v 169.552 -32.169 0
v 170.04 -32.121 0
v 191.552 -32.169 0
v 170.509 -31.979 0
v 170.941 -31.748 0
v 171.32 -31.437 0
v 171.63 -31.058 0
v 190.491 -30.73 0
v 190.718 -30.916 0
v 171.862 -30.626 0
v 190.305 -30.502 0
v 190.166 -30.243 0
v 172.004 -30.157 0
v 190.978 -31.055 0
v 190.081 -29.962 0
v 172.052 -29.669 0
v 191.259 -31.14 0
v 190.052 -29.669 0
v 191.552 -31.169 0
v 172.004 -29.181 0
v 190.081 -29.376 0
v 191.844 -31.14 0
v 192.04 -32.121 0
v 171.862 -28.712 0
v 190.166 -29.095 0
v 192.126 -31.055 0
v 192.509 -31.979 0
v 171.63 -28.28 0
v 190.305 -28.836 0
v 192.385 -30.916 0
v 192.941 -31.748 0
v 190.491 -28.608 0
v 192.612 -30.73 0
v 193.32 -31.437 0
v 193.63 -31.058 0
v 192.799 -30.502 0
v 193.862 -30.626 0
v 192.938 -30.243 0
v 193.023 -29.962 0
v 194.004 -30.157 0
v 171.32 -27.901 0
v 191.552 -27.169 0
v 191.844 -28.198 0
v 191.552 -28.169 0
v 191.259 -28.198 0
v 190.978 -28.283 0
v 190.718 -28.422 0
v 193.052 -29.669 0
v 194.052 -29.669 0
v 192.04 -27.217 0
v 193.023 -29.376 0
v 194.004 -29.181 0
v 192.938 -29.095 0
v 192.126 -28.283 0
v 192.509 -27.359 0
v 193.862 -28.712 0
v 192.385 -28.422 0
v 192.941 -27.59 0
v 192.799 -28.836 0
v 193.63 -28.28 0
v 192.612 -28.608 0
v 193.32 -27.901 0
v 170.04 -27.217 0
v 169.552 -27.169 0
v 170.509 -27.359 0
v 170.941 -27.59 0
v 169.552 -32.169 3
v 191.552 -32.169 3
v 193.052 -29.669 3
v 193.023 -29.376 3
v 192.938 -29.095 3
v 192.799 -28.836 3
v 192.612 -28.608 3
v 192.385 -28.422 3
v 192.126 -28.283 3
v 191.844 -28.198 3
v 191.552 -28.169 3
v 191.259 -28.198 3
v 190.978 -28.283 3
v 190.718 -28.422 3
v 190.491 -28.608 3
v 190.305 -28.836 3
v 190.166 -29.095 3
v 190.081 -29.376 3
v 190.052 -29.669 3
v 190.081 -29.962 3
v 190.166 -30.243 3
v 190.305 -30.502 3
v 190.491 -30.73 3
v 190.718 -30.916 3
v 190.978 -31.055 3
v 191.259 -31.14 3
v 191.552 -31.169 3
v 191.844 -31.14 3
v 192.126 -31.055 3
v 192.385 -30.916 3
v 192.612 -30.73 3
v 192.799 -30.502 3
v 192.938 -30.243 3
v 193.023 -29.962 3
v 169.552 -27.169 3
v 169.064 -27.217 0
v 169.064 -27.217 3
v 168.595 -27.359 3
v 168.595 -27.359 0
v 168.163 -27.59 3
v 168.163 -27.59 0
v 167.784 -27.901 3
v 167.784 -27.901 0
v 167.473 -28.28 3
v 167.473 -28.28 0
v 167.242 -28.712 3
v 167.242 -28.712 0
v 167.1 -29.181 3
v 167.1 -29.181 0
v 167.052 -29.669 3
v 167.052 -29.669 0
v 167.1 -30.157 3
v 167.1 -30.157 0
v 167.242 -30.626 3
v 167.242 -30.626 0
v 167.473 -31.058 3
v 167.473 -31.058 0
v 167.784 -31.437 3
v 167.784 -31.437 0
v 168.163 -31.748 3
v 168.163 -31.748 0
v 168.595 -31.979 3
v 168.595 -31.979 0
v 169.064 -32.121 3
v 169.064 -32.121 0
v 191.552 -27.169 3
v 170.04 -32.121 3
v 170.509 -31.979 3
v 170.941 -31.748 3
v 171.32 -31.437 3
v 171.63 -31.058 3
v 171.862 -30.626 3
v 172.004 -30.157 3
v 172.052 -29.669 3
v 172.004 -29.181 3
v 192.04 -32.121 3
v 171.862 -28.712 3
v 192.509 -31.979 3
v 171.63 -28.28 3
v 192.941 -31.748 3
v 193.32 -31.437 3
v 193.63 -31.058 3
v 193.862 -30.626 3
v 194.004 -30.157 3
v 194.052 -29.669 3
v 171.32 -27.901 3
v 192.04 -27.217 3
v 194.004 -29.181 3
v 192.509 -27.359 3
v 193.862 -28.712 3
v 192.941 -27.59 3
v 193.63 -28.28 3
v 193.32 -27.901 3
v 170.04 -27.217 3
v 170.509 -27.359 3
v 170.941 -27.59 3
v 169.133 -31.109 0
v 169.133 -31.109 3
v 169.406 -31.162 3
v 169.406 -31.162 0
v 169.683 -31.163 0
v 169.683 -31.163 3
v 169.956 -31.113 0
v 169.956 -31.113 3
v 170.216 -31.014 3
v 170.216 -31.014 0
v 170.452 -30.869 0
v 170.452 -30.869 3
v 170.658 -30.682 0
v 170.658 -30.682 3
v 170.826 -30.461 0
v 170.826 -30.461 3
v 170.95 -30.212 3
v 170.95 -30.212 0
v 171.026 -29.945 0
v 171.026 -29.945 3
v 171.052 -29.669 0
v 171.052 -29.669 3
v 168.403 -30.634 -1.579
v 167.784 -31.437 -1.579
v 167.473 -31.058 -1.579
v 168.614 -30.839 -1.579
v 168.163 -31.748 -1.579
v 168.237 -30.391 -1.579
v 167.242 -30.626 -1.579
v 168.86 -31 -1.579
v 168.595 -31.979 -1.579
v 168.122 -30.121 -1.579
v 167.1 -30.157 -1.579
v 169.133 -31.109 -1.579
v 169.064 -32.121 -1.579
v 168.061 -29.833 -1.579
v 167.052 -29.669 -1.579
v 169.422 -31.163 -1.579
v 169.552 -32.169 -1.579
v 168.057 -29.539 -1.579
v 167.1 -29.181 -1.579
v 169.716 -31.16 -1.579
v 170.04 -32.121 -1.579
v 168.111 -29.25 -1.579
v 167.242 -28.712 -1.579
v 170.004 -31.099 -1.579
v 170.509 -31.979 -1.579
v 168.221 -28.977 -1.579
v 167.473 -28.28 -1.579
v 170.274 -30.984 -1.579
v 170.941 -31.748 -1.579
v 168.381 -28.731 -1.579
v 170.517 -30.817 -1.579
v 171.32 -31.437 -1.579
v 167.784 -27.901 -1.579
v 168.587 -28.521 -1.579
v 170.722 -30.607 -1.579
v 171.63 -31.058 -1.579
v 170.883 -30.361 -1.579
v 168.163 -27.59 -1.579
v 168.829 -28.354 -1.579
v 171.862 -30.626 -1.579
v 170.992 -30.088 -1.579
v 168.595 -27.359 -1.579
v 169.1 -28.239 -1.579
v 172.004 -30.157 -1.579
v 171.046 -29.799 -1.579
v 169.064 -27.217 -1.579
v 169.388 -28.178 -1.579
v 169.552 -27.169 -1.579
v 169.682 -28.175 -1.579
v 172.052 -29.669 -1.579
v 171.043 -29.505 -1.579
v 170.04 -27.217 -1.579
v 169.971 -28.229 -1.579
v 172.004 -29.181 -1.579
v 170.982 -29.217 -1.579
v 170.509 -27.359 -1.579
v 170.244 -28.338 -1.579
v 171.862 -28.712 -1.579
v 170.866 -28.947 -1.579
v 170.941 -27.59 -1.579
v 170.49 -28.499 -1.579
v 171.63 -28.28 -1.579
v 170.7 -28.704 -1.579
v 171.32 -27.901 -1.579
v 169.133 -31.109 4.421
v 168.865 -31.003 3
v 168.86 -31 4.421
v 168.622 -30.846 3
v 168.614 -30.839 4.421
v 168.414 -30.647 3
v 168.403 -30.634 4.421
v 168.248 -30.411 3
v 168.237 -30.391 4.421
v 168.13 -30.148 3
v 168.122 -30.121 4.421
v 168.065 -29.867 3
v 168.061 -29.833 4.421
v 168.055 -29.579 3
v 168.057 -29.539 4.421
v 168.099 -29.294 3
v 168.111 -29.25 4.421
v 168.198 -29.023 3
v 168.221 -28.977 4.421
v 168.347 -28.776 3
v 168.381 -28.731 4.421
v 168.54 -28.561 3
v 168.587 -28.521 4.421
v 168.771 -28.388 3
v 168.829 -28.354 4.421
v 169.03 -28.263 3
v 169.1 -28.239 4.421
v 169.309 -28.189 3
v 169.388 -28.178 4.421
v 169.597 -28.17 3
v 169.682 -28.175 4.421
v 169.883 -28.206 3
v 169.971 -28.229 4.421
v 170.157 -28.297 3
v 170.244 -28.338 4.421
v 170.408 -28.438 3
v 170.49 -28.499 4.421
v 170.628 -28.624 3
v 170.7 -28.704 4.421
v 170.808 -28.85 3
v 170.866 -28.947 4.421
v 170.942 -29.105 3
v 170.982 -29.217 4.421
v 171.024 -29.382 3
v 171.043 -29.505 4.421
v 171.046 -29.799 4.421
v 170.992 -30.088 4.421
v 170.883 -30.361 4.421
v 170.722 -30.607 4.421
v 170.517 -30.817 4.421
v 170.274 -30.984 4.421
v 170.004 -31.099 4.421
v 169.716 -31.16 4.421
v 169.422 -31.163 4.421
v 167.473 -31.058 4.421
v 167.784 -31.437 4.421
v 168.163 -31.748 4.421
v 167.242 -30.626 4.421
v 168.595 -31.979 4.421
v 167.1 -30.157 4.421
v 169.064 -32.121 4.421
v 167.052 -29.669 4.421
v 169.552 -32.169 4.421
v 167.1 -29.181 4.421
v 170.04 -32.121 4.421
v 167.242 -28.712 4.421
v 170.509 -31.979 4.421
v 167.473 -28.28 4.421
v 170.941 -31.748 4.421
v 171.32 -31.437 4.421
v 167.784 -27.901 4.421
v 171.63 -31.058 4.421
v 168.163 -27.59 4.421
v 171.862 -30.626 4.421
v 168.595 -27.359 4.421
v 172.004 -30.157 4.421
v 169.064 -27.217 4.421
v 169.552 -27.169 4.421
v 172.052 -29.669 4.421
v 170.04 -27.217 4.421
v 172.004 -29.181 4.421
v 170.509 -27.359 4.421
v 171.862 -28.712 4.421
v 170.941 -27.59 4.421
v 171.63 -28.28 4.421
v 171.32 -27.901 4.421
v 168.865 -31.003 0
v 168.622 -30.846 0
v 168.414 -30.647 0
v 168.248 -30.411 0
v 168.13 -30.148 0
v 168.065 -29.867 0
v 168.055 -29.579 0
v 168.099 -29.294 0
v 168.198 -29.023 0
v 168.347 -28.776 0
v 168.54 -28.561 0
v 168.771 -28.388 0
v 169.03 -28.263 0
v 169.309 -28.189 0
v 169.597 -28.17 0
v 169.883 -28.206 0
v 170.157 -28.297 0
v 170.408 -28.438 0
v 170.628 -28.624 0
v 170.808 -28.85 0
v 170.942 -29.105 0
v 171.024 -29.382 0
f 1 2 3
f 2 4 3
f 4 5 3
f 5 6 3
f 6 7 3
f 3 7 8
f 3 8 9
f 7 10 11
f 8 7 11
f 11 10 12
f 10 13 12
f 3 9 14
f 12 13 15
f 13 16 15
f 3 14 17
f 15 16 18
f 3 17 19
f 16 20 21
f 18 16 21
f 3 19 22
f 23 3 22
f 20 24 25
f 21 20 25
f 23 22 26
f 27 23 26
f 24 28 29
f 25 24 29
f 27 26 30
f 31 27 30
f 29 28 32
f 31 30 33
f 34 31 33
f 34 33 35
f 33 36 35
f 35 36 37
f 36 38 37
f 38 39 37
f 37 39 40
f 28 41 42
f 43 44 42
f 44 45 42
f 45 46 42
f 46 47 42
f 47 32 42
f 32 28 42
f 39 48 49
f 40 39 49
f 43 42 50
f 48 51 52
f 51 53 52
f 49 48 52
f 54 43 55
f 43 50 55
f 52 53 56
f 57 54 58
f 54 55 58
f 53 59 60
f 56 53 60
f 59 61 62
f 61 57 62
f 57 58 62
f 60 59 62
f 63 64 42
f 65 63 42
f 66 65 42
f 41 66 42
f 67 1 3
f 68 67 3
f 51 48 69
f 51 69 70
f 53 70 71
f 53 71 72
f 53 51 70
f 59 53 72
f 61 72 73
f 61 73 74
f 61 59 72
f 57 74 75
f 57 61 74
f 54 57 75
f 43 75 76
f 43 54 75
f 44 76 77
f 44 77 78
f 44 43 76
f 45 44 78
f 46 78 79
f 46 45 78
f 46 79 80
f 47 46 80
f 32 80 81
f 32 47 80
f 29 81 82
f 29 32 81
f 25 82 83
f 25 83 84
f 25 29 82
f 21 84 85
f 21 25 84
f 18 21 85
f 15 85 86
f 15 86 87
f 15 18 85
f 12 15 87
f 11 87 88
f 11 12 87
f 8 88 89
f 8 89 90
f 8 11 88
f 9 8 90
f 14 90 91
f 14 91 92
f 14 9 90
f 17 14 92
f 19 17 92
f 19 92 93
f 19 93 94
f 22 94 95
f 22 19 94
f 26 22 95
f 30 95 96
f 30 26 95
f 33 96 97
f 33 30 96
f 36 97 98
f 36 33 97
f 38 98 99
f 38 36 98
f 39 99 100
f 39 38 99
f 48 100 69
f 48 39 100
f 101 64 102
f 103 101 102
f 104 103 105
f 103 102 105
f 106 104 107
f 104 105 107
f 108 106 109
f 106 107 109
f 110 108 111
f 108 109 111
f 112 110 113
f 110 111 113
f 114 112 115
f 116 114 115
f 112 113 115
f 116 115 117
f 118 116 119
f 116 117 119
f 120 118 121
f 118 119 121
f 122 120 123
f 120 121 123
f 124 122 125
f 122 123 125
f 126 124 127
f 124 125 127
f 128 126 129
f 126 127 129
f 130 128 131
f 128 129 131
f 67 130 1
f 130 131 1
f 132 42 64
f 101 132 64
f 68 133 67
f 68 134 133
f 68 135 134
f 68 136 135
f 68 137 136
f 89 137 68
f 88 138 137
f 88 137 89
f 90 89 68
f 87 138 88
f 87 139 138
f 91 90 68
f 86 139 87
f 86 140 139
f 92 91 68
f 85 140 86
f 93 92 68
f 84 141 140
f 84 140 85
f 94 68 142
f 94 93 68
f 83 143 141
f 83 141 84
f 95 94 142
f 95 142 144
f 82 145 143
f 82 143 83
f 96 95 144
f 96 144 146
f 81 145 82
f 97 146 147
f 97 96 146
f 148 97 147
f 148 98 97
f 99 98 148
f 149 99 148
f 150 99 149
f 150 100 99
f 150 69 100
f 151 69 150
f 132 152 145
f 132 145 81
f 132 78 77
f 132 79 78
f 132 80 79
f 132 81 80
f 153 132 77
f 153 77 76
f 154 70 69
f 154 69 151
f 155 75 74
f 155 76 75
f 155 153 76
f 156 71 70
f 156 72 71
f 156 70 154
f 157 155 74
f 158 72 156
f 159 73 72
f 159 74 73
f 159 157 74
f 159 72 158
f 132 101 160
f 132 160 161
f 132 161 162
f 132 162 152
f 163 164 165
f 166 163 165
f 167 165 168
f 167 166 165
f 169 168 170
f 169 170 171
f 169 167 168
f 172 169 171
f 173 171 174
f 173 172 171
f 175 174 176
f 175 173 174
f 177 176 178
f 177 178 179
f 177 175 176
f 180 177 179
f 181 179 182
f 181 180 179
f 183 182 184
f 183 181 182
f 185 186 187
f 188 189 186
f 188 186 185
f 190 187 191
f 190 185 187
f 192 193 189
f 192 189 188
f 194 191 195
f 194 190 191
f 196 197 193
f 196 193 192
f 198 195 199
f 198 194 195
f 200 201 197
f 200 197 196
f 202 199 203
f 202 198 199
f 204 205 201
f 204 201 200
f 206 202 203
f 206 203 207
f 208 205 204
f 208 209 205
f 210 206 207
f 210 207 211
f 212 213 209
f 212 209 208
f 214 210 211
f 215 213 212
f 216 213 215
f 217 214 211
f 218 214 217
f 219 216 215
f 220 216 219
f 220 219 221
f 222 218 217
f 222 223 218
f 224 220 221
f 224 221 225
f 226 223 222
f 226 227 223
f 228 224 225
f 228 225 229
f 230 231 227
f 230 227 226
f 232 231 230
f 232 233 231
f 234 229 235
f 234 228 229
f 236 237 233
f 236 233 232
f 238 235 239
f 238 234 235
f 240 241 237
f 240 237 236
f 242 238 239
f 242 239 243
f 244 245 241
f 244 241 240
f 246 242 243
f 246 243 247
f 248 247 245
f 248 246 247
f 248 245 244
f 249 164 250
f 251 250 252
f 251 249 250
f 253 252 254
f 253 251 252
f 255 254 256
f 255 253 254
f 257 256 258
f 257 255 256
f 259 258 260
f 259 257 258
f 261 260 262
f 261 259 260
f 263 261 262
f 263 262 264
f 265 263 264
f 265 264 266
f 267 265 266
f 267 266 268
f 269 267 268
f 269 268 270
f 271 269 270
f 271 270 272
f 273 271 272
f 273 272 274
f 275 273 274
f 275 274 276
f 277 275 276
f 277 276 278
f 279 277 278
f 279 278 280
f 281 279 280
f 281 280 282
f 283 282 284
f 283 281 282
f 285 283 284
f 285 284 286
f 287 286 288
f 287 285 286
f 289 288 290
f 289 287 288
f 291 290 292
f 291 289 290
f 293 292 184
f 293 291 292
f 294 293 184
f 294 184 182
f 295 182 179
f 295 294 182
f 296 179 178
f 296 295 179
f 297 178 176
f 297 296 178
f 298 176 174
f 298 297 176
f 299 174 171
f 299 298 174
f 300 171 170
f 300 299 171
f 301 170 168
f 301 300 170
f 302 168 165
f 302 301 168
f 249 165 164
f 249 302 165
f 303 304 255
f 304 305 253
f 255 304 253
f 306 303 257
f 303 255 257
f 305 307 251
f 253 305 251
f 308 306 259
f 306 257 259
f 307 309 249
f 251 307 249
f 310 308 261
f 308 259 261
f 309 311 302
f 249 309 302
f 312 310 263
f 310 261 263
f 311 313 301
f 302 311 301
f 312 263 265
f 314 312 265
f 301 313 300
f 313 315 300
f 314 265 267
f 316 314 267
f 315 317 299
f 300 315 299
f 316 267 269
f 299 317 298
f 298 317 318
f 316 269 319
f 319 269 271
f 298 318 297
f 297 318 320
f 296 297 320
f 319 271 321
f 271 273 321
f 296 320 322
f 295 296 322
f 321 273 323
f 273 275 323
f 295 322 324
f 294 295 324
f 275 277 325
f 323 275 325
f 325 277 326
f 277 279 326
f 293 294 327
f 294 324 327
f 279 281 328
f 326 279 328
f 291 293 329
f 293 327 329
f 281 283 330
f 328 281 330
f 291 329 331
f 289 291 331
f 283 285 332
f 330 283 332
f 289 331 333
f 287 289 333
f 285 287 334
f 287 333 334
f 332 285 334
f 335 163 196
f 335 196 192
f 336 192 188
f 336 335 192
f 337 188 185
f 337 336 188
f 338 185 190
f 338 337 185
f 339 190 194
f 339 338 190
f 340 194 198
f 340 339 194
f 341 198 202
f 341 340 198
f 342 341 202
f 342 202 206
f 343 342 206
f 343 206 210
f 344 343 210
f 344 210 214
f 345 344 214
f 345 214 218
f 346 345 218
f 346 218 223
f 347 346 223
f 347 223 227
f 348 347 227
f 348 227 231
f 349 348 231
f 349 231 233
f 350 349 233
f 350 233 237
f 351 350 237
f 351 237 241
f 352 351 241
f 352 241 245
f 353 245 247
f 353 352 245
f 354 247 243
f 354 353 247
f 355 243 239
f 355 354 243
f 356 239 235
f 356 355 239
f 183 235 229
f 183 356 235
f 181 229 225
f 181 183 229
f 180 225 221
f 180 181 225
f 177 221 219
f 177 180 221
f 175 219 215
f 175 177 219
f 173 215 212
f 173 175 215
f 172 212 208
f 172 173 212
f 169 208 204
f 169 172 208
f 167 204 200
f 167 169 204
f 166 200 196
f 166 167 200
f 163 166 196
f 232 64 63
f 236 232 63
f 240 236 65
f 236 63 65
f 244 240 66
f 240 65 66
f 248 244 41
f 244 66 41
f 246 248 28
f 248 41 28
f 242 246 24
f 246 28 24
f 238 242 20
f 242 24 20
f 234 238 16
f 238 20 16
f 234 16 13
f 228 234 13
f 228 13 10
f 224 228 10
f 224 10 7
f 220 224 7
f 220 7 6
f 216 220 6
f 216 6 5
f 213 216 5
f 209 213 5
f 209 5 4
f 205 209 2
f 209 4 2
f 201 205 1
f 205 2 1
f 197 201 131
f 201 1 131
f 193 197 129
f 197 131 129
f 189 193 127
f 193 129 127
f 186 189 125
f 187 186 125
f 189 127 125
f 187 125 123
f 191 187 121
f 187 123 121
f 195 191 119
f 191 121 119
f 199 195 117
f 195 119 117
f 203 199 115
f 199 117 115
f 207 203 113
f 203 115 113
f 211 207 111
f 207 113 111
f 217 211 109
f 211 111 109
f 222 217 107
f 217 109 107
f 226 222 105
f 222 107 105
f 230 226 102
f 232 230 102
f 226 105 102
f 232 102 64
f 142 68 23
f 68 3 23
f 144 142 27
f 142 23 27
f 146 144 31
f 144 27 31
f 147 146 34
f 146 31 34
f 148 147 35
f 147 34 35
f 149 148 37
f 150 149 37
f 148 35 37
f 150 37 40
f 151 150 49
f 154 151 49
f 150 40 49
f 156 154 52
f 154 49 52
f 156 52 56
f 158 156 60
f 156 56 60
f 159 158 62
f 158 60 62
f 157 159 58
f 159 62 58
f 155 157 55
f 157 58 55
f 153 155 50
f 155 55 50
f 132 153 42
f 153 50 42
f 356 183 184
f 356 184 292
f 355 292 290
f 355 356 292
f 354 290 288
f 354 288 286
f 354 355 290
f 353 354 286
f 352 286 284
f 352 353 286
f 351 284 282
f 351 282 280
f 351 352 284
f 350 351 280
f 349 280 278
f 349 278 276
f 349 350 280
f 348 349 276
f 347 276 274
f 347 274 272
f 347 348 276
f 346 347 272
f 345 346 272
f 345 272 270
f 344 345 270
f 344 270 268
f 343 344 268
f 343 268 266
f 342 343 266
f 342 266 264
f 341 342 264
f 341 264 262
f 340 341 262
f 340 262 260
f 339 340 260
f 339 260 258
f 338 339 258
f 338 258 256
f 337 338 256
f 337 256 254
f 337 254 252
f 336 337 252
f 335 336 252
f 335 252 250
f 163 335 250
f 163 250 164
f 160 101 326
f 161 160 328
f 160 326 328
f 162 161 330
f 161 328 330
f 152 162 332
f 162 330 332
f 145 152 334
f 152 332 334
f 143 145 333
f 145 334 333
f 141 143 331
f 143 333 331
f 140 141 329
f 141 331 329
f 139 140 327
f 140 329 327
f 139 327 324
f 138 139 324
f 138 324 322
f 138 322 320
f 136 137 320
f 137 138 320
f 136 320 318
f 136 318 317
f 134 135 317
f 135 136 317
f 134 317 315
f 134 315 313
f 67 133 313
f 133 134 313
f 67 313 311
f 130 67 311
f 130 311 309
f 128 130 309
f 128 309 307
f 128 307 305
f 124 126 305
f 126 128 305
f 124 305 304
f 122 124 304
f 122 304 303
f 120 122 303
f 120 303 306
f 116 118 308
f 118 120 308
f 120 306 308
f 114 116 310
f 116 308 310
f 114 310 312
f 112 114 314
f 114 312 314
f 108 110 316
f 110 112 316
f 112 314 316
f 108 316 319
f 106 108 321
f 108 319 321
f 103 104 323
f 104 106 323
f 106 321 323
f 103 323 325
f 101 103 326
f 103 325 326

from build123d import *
from build123d.topology import SkipClean

# Parameters (mm, degrees)
CROQUIS1_R                   = 2.5
CROQUIS1_R_2                 = 1.5
SALIENTE_EXTRUIR1_DEPTH      = 3
SALIENTE_EXTRUIR2_DEPTH      = 3.078873
SALIENTE_EXTRUIR2_DEPTH_BACK = 2.921127
CROQUIS2_R                   = 2.5
CROQUIS2_R_2                 = 1.5


with BuildPart() as part:
    # Croquis1 → Saliente-Extruir1 (new body)
    # profile 1 of 3: a face of its own
    with BuildSketch(Plane.XY):
        with BuildLine():
            Line((191.551801515, -27.168993214), (169.551801515, -27.168993214))
            ThreePointArc((169.551801515, -27.168993214), (171.319568468, -27.901226261), (172.051801515, -29.668993214))
            ThreePointArc((172.051801515, -29.668993214), (171.319568468, -31.436760167), (169.551801515, -32.168993214))
            Line((169.551801515, -32.168993214), (191.551801515, -32.168993214))
            ThreePointArc((191.551801515, -32.168993214), (189.051801515, -29.668993214), (191.551801515, -27.168993214))
        make_face()
    # profile 2 of 3: a face of its own
    with BuildSketch(Plane.XY):
        with Locations((191.551801515, -29.668993214)):
            Circle(CROQUIS1_R)
        with Locations((191.551801515, -29.668993214)):
            Circle(CROQUIS1_R_2, mode=Mode.SUBTRACT)
    # profile 3 of 3: a face of its own
    with BuildSketch(Plane.XY):
        with Locations((169.551801515, -29.668993214)):
            Circle(CROQUIS1_R)
        with Locations((169.551801515, -29.668993214)):
            Circle(CROQUIS1_R_2, mode=Mode.SUBTRACT)
    extrude(amount=SALIENTE_EXTRUIR1_DEPTH)

    # Croquis2 → Saliente-Extruir2 (add, two sides: drawn at the far end of the back side and taken through both)
    with SkipClean():  # the faces are left unmerged after this step: merging them gives an invalid solid
        with BuildSketch(Plane(origin=(0, 0, 1.5), x_dir=(-1, 0, 0), z_dir=(0, 0, -1)).offset(-SALIENTE_EXTRUIR2_DEPTH_BACK)):
            with Locations(Location((-169.551801515, -29.668993214, 0), (0, 0, 90))):
                Circle(CROQUIS2_R)
            with Locations(Location((-169.551801515, -29.668993214, 0), (0, 0, 286.214321969))):
                Circle(CROQUIS2_R_2, mode=Mode.SUBTRACT)
        extrude(amount=SALIENTE_EXTRUIR2_DEPTH + SALIENTE_EXTRUIR2_DEPTH_BACK)


solid = part.part
